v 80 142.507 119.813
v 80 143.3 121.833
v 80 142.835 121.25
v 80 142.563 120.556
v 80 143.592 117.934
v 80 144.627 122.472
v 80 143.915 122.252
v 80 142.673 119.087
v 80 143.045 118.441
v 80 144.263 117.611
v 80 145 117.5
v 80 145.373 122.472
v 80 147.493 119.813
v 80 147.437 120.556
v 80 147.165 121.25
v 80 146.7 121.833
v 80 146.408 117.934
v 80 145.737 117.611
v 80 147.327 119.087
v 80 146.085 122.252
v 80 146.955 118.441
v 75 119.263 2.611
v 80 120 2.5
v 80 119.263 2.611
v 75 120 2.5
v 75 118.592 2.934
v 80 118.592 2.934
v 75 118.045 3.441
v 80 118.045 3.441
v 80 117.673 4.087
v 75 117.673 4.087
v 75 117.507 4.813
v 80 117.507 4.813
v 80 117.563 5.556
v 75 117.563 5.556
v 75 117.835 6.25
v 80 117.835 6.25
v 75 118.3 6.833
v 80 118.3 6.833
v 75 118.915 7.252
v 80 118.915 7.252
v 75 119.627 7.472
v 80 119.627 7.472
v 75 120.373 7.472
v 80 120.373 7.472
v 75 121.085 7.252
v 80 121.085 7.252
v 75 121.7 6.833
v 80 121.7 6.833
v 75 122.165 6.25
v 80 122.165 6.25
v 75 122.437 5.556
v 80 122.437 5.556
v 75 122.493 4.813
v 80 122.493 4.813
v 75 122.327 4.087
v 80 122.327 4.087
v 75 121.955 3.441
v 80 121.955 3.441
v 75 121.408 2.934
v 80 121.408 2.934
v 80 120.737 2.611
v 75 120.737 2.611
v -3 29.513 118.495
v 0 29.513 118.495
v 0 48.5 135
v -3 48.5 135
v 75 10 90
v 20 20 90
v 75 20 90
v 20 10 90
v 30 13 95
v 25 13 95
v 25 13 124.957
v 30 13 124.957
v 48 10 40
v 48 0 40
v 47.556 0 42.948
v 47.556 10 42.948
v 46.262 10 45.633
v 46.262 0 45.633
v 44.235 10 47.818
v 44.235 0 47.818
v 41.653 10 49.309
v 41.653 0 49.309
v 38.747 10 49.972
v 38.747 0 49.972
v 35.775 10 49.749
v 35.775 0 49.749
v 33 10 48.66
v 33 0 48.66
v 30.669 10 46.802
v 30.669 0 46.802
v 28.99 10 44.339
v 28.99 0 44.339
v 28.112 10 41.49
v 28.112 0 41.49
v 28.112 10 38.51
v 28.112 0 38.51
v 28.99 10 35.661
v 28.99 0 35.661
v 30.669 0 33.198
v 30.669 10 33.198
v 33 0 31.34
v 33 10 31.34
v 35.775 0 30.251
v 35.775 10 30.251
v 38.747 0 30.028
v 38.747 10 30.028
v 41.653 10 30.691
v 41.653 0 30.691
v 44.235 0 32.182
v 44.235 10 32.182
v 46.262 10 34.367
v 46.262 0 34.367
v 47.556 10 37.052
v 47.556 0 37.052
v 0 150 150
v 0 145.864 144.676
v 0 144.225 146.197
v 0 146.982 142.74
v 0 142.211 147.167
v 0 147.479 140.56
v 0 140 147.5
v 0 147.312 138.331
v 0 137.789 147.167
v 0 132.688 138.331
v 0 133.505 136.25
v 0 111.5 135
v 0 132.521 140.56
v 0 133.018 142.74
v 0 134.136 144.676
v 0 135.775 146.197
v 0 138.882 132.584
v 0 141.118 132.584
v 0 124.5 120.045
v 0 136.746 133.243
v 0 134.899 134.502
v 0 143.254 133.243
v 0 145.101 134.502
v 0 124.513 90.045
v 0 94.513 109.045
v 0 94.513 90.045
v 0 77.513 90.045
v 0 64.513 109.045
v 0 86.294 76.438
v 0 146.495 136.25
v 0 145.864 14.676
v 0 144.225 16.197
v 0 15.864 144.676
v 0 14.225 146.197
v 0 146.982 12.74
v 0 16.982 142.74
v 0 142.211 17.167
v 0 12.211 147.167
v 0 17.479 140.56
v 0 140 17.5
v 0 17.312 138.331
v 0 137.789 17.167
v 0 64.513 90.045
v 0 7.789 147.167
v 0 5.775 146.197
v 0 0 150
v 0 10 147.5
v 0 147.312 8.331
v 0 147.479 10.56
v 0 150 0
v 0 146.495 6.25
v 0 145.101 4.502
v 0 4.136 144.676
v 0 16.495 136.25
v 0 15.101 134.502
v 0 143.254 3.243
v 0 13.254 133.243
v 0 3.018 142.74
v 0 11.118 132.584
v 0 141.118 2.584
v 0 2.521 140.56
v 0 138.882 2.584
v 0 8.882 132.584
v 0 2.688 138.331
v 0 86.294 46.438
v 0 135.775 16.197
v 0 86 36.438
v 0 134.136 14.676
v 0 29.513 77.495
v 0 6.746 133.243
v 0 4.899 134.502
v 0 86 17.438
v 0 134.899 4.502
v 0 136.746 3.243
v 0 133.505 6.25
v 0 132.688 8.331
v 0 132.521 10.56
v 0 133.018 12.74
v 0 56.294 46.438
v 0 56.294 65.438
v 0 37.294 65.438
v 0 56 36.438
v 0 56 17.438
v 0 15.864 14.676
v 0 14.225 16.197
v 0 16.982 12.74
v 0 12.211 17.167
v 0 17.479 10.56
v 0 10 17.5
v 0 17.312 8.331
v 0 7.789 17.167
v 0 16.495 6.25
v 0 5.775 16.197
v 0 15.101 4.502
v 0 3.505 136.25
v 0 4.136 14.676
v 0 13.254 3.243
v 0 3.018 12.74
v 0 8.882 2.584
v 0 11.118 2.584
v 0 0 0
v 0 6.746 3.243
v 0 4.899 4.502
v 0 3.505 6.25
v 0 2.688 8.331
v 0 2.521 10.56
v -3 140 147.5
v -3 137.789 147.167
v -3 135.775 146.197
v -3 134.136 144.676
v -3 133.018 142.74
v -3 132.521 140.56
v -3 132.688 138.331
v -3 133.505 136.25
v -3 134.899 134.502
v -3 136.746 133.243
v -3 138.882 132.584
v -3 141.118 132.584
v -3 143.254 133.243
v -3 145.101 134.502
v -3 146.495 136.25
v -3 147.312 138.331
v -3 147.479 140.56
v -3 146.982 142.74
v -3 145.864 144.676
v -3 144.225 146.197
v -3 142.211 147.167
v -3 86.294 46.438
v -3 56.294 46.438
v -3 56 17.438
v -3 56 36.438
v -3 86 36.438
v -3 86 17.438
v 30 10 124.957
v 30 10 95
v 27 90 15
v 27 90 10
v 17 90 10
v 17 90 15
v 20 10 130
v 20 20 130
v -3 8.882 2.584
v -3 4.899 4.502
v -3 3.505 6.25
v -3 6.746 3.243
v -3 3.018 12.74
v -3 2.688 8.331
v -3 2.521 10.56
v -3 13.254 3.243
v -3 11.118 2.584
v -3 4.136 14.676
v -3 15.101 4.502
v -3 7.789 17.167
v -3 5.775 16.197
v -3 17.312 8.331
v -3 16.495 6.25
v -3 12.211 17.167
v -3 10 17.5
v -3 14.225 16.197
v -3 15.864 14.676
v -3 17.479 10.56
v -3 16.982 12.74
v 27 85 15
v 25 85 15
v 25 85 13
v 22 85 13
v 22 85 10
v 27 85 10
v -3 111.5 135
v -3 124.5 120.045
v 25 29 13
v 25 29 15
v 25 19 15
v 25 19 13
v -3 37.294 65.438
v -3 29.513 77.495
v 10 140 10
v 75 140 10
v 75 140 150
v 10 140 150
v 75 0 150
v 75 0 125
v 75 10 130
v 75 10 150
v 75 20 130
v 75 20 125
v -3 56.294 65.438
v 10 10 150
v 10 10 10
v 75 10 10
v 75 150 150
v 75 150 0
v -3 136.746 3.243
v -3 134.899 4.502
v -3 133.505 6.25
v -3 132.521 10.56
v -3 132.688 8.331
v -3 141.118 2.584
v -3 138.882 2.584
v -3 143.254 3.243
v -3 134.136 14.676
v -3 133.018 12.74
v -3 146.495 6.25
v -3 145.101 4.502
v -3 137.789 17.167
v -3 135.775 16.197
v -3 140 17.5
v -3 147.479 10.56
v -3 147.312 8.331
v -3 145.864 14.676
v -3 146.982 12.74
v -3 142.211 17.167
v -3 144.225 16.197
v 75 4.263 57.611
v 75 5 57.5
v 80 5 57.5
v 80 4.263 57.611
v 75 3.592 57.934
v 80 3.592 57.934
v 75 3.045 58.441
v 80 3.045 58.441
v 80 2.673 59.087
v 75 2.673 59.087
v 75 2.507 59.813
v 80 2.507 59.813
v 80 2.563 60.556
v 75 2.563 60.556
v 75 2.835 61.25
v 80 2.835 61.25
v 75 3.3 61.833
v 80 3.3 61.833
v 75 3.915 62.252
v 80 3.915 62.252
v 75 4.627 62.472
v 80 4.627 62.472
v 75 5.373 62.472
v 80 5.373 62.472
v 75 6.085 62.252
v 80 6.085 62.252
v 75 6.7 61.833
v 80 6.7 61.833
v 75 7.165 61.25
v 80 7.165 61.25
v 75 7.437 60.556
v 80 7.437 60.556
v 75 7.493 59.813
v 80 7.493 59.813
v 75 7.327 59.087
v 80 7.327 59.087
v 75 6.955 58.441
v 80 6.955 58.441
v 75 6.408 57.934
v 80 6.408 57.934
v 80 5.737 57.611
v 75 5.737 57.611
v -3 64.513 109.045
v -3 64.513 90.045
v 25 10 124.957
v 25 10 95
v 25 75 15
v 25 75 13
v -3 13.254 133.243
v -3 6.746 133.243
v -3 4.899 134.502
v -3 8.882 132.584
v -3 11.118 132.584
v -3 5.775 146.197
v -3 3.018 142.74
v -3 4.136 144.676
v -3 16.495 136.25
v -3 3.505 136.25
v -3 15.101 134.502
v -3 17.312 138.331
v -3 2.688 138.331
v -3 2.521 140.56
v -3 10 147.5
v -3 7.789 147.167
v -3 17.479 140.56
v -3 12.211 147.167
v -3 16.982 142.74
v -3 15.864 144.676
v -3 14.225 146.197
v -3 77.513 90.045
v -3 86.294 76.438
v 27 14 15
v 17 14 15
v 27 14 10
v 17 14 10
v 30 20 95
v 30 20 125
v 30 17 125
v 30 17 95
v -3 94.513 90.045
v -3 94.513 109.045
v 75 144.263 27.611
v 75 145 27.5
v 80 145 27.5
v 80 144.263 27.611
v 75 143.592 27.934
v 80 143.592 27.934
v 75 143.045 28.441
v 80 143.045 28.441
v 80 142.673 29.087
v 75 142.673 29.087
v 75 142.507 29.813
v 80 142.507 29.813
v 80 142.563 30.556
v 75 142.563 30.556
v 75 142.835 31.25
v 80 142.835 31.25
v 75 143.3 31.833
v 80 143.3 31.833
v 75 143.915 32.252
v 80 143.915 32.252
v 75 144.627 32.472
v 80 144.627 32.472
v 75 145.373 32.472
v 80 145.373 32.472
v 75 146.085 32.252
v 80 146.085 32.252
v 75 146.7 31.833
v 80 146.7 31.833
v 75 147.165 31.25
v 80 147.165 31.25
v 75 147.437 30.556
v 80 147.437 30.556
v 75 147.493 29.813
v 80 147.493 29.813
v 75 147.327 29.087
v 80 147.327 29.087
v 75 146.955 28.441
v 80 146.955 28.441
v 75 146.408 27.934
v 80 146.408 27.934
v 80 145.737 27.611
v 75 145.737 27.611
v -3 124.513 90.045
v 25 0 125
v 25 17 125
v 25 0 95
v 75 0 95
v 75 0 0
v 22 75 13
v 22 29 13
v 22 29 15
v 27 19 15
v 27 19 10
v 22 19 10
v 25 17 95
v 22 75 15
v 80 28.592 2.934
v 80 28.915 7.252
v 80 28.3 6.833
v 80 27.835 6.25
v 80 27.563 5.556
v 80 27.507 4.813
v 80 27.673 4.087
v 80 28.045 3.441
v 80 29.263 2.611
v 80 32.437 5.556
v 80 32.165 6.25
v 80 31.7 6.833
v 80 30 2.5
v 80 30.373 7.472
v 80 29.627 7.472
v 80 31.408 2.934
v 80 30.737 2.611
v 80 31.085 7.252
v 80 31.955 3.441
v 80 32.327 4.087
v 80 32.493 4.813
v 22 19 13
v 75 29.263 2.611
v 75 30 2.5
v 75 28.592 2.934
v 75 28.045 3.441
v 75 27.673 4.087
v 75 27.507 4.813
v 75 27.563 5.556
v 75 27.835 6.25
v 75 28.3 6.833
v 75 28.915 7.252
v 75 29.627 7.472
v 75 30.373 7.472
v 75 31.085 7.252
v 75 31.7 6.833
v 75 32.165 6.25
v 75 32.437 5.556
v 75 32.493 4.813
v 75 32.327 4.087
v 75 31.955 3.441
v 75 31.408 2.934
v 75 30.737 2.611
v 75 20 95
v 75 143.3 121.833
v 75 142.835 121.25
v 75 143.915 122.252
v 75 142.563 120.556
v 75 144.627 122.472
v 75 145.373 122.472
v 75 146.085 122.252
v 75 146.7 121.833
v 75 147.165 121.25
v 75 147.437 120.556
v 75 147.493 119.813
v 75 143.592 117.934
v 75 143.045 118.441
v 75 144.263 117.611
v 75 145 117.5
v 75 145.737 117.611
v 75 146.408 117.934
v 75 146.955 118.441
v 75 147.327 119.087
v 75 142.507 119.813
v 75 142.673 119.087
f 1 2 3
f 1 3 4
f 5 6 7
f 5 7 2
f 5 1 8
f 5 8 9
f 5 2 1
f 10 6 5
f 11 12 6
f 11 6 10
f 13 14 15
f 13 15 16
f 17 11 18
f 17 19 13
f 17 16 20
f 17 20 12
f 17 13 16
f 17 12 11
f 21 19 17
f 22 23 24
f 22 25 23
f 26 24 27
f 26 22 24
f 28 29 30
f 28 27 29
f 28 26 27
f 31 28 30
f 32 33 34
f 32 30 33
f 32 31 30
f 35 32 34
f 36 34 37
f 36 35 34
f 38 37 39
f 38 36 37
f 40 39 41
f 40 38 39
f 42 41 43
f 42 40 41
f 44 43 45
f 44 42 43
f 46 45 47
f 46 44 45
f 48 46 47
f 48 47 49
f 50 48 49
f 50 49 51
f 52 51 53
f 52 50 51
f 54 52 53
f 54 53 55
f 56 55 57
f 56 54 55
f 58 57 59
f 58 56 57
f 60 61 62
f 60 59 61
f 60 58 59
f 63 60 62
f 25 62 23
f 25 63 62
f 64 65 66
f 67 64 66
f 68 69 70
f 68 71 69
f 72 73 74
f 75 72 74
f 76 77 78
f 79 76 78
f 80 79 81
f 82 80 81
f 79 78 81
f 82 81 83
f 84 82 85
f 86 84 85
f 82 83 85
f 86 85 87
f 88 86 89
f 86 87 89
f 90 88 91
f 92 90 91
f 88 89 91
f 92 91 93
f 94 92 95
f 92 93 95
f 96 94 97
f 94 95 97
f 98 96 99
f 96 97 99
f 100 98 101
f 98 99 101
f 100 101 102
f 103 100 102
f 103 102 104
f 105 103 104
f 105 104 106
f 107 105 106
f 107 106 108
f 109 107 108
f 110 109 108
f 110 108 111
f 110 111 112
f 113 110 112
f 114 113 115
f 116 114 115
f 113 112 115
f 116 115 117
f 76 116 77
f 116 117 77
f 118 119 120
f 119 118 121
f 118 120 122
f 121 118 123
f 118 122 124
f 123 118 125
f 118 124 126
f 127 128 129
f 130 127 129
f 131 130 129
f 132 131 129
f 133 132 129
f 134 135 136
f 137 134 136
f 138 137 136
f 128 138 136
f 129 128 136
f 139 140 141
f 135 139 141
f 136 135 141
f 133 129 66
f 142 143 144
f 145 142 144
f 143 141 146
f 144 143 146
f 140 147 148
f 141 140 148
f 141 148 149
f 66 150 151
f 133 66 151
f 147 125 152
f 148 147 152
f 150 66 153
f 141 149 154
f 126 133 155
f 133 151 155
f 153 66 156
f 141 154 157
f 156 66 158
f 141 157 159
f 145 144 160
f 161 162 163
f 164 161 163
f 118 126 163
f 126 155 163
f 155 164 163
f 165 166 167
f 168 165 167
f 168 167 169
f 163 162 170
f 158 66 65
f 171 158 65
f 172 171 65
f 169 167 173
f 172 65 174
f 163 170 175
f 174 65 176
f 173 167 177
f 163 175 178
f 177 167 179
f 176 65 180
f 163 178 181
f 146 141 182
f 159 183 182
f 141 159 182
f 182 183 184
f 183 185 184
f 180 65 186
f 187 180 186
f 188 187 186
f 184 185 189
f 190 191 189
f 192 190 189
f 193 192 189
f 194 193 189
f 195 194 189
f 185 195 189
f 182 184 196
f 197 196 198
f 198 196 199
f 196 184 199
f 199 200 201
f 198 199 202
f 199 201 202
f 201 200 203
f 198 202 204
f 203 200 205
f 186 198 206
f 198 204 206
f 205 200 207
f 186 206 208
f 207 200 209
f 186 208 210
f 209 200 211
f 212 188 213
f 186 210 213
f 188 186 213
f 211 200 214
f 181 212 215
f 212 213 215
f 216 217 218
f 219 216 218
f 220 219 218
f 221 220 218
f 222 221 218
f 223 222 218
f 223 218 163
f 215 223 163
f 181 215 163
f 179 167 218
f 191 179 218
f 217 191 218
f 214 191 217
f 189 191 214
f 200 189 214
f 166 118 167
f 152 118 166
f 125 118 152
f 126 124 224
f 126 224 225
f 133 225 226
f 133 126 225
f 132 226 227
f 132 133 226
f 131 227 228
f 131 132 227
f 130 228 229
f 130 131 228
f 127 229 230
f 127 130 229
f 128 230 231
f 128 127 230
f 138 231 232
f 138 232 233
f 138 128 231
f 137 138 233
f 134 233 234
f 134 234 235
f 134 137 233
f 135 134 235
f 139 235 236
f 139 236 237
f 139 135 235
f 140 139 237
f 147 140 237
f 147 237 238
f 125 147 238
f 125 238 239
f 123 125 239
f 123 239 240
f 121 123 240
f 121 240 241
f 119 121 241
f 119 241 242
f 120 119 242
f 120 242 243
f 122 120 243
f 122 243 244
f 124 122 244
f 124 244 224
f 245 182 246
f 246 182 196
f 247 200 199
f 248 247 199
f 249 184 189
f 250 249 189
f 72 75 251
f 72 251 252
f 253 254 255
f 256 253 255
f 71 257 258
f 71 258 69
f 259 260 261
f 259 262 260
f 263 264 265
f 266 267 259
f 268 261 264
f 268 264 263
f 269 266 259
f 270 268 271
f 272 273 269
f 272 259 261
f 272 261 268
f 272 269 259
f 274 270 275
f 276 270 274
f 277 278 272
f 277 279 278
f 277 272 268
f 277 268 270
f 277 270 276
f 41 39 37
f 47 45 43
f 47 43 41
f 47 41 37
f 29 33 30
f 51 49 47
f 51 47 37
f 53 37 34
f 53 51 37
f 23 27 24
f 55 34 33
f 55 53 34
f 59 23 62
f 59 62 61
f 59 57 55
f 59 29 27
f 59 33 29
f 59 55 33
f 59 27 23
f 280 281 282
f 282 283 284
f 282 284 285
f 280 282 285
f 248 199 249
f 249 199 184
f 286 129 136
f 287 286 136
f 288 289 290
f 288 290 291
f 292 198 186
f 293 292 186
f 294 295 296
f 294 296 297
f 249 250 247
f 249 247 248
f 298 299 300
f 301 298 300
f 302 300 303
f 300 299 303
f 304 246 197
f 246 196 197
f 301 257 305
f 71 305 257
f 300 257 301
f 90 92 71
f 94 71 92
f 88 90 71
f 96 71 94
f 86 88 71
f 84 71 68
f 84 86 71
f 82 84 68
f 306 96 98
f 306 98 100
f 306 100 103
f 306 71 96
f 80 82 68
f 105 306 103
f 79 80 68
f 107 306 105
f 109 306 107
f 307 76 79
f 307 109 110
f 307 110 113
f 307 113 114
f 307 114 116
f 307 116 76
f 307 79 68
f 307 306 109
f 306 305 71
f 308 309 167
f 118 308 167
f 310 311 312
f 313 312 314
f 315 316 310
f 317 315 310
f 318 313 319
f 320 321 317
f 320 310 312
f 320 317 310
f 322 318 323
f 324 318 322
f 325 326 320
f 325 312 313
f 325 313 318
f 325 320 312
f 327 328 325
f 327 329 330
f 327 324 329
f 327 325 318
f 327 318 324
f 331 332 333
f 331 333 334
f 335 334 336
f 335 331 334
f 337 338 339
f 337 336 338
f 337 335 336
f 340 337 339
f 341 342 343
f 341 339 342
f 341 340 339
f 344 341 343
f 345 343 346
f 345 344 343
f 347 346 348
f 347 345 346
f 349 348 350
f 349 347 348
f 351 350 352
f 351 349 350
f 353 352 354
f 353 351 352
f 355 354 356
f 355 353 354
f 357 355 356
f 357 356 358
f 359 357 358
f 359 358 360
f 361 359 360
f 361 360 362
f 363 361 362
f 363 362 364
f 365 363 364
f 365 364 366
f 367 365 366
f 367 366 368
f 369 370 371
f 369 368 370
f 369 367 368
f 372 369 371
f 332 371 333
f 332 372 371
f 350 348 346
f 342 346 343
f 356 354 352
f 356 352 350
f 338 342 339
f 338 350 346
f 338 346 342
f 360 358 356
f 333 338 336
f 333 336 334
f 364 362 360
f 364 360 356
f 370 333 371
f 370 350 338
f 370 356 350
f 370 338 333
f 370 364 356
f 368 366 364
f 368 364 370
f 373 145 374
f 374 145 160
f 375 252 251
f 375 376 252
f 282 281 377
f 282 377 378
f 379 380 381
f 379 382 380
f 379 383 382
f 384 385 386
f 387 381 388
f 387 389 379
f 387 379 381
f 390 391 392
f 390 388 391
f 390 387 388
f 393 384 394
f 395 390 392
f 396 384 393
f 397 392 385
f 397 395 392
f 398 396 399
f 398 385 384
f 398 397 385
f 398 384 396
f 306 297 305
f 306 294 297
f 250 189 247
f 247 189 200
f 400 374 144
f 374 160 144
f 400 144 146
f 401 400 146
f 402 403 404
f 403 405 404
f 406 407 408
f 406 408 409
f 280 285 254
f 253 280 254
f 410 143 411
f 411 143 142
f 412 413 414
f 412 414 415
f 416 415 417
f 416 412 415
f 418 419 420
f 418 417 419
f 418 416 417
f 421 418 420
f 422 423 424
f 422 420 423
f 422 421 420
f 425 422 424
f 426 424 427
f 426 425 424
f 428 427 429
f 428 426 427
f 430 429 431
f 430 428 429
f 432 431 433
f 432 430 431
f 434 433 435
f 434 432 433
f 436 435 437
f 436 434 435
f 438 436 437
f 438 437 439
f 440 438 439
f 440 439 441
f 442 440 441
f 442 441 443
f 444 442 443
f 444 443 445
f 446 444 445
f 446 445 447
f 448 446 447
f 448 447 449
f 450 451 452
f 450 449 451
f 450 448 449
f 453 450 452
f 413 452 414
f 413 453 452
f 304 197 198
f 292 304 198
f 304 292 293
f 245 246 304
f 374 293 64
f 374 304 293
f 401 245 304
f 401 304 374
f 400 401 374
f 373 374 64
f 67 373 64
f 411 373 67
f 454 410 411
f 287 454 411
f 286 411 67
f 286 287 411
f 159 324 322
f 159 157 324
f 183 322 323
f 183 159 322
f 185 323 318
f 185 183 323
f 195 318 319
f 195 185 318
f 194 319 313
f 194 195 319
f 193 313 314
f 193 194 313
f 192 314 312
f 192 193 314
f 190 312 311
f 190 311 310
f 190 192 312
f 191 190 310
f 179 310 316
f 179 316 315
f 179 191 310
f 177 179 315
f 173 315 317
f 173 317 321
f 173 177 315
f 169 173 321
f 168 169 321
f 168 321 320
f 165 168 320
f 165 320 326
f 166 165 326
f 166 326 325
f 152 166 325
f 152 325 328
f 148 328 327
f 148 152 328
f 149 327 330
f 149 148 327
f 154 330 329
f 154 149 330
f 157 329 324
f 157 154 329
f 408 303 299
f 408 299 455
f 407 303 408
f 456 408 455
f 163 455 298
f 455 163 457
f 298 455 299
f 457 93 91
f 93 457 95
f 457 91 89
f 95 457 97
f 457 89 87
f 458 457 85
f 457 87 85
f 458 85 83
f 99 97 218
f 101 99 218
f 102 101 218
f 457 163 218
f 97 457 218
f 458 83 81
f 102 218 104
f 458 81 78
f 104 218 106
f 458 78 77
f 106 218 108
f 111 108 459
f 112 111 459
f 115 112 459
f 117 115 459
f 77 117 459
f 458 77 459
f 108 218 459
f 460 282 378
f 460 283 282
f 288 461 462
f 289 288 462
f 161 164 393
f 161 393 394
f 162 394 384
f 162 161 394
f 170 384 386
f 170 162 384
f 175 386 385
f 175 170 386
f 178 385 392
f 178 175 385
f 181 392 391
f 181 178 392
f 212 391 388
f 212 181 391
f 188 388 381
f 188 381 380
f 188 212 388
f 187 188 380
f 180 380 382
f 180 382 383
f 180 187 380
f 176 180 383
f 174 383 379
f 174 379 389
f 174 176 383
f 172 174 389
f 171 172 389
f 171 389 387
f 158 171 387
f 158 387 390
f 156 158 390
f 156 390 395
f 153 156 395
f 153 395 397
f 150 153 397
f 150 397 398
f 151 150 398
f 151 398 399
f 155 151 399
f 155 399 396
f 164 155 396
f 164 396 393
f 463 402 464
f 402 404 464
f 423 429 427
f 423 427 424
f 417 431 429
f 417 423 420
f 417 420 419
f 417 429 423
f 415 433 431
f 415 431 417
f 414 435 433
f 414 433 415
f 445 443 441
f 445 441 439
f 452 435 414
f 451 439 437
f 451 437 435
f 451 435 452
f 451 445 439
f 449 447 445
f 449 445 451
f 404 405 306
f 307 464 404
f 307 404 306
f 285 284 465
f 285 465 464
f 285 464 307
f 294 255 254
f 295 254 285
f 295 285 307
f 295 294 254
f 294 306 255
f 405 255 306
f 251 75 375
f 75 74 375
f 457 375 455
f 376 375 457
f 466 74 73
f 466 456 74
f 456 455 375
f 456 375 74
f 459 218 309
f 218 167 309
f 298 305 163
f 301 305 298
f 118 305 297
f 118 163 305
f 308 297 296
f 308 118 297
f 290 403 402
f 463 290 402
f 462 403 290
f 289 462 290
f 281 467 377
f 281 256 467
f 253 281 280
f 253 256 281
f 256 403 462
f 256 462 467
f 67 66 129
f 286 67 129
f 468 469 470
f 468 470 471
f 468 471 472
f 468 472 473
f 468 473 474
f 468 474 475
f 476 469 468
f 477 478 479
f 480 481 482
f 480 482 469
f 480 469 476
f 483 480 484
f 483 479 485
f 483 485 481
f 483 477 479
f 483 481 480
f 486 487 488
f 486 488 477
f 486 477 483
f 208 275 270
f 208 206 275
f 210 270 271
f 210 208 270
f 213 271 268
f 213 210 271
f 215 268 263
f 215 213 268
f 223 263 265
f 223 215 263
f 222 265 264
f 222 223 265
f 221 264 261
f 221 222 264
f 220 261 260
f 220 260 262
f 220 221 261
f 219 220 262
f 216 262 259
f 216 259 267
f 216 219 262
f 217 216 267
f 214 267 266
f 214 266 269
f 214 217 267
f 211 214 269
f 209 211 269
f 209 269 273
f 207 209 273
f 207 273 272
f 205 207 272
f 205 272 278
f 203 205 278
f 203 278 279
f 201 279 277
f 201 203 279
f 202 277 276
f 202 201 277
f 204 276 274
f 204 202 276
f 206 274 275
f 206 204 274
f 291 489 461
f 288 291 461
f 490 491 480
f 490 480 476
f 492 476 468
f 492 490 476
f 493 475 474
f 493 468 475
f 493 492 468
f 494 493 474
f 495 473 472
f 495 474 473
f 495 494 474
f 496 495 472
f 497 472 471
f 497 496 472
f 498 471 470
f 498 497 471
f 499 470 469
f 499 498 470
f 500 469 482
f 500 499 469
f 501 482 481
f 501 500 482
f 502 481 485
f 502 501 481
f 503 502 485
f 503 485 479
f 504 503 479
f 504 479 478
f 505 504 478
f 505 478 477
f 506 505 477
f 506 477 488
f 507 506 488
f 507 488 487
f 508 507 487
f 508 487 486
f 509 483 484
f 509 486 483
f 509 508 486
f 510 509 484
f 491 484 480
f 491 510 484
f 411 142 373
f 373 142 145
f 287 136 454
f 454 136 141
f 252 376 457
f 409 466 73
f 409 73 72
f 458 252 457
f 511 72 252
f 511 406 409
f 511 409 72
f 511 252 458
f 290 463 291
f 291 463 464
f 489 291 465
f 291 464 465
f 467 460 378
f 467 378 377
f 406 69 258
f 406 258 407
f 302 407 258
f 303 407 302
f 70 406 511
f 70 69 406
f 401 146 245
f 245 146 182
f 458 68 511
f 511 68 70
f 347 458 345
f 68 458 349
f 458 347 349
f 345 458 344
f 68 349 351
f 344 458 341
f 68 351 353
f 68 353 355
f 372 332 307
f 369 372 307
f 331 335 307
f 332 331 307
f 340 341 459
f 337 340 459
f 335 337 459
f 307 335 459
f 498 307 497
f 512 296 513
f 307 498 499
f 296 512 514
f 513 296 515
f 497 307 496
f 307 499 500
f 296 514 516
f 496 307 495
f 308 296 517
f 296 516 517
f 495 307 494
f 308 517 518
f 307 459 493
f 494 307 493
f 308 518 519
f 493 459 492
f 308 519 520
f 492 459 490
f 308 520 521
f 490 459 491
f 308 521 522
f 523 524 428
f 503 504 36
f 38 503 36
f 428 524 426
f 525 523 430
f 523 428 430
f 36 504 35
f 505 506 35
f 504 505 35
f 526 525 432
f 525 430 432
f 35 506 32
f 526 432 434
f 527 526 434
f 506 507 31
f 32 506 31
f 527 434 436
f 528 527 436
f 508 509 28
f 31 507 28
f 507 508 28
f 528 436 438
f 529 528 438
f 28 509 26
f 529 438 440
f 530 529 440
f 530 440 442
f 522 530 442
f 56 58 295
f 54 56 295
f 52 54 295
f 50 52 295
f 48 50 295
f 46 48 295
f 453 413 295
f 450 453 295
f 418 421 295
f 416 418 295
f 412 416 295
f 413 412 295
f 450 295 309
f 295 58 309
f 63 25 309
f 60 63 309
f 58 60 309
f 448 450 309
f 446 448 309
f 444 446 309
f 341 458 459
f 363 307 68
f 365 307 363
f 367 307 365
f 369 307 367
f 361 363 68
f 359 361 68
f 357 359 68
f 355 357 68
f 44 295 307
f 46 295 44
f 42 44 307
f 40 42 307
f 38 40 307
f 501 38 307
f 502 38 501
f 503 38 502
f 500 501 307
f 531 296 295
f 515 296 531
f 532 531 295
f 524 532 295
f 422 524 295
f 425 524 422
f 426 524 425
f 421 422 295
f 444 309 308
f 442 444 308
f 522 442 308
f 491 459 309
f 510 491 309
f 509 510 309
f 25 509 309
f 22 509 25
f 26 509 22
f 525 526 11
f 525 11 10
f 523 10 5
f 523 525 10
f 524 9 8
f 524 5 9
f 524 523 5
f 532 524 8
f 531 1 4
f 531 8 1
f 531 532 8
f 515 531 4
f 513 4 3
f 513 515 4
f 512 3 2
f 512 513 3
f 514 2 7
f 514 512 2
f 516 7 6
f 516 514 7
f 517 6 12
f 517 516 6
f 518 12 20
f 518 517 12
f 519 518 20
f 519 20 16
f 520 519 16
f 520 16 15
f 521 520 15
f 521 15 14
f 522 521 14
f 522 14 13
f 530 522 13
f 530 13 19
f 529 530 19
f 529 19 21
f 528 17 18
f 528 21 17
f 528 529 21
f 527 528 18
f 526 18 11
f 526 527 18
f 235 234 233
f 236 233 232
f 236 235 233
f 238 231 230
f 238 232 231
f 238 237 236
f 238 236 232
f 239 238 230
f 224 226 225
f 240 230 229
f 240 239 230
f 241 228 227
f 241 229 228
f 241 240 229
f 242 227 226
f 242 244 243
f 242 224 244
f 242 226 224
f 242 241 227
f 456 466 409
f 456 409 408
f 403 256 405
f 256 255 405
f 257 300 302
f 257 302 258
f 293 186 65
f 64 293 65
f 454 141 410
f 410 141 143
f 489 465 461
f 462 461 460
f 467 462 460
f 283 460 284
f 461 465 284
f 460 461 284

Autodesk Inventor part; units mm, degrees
ref_plane "YZ Plane" through (0, 0, 0) normal (1, 0, 0) x (0, 1, 0)
ref_plane "XZ Plane" through (0, 0, 0) normal (0, 1, 0) x (-1, 0, 0)
ref_plane "XY Plane" through (0, 0, 0) normal (0, 0, 1) x (1, 0, 0)
sketch "Sketch1" plane through (0, 0, 0) normal (0, 0, 1) x (1, 0, 0)
  line L0 (0, 0) -> (75, 0)
  line L1 (75, 0) -> (75, 150)
  line L2 (75, 150) -> (0, 150)
  line L3 (0, 150) -> (0, 0)
  dimension "d0" = 75
  dimension "d1" = 150
extrude "Extrusion1" add sketch "Sketch1" along normal blind 10
sketch "Sketch2" plane through (0, 0, 10) normal (0, 0, 1) x (1, 0, 0)
  line L0 (17, 90) -> (17, 14)
  line L1 (17, 14) -> (27, 14)
  line L2 (27, 14) -> (27, 19)
  line L3 (27, 19) -> (22, 19)
  line L4 (22, 19) -> (22, 85)
  line L5 (22, 85) -> (27, 85)
  line L6 (27, 85) -> (27, 90)
  line L7 (27, 90) -> (17, 90)
  line L8 (75, 0) -> (75, 150) projected
  line L9 (75, 150) -> (0, 150) projected
  point P0 (0, 0)
  dimension "d4" = 76
  dimension "d5" = 10
  dimension "d6" = 5
  dimension "d7" = 66
  dimension "d8" = 53
  dimension "d9" = 5
  dimension "d10" = 60
extrude "Extrusion2" add sketch "Sketch2" along normal blind 5
sketch "Sketch3" plane through (22, 19, 10) normal (1, 0, 0) x (0, 0, -1)
  line L0 (-5, 0) -> (-5, 66) projected
  line L1 (-5, 66) -> (-3, 66)
  line L2 (-3, 66) -> (-3, 56)
  line L3 (-3, 56) -> (-5, 56)
  line L4 (-5, 56) -> (-5, 66)
  line L5 (-5, 0) -> (-3, 0)
  line L6 (-3, 0) -> (-3, 10)
  line L7 (-3, 10) -> (-5, 10)
  line L8 (-5, 10) -> (-5, 0)
  point P0 (10, -19)
  point P1 (-5, 10)
  point P2 (-5, 56)
  dimension "d13" = 2
  dimension "d14" = 10
  dimension "d15" = 10
  dimension "d73" = 2
extrude "Extrusion3" add sketch "Sketch3" along normal blind 3
sketch "Sketch4" plane through (0, 0, 10) normal (0, 0, 1) x (1, 0, 0)
  line L0 (75, 0) -> (75, 150) projected
  line L1 (75, 140) -> (10, 140)
  line L2 (10, 140) -> (10, 10)
  line L3 (10, 10) -> (75, 10)
  line L4 (75, 150) -> (0, 150) projected
  line L5 (0, 150) -> (0, 0) projected
  line L6 (0, 0) -> (75, 0) projected
  dimension "d18" = 10
  dimension "d19" = 10
  dimension "d20" = 10
extrude "Extrusion4" add sketch "Sketch4" along normal blind 140 contours L6 L5 L4 L0 L1 L2 L3
sketch "Sketch5" plane through (0, 0, 0) normal (-1, 0, 0) x (0, 0, 1)
  line L0 (90.0447, 124.5126) -> (90.0447, 94.5126)
  line L1 (90.0447, 94.5126) -> (109.0447, 94.5126)
  line L2 (109.0447, 94.5126) -> (109.0447, 64.5126)
  line L3 (109.0447, 64.5126) -> (90.0447, 64.5126)
  line L4 (90.0447, 64.5126) -> (90.0447, 77.5126)
  line L5 (90.0447, 77.5126) -> (76.4377, 86.2941)
  line L6 (76.4377, 86.2941) -> (46.4377, 86.2941)
  line L7 (46.4377, 86.2941) -> (46.4377, 56.2941)
  line L8 (46.4377, 56.2941) -> (65.4377, 56.2941)
  line L9 (65.4377, 56.2941) -> (65.4377, 37.2941)
  line L10 (65.4377, 37.2941) -> (77.4951, 29.5126)
  line L11 (77.4951, 29.5126) -> (118.4951, 29.5126)
  line L12 (118.4951, 29.5126) -> (135, 48.5)
  line L13 (135, 48.5) -> (135, 111.5)
  line L14 (135, 111.5) -> (120.0447, 124.5)
  line L15 (120.0447, 124.5) -> (90.0447, 124.5126)
  line L16 (0, 0) -> (150, 0) projected
  line L17 (150, 150) -> (150, 0) projected
  line L18 (36.4377, 86) -> (17.4377, 86)
  line L19 (17.4377, 86) -> (17.4377, 56)
  line L20 (17.4377, 56) -> (36.4377, 56)
  line L21 (36.4377, 56) -> (36.4377, 86)
  line L22 (10, 140) -> (150, 140) projected
  circle A0 centre (140, 140) radius 7.5
  line L23 (10, 10) -> (150, 10) projected
  circle A1 centre (140, 10) radius 7.5
  circle A2 centre (10, 140) radius 7.5
  line L24 (10, 10) -> (10, 140) projected
  circle A3 centre (10, 10) radius 7.5
  point P0 (99.5447, 64.5126)
  point P1 (135, 80)
  point P2 (26.9377, 56)
  dimension "d43" = 30
  dimension "d44" = 19
  dimension "d45" = 30
  dimension "d46" = 13
  dimension "d47" = 30
  dimension "d48" = 30
  dimension "d49" = 19
  dimension "d50" = 19
  dimension "d51" = 41
  dimension "d52" = 63
  dimension "d53" = 13
  dimension "d56" = 35
  dimension "d57" = 95
  dimension "d58" = 30
  dimension "d59" = 80
  dimension "d60" = 25.9553
  dimension "d61" = 15
  dimension "d62" = 19
  dimension "d63" = 10
  dimension "d67" = 15
  dimension "d68" = 15
  dimension "d69" = 15
  dimension "d70" = 15
  dimension "d71" = 10
  dimension "d72" = 10
  dimension "d112" = 56
  dimension "d113" = 30
extrude "Extrusion5" add sketch "Sketch5" along normal blind 3 contours L15 L14 L13 L12 L11 L10 L9 L8 L7 L6 L5 L4 L3 L2 L1 L0 | A0 L22 | L22 A0 | A1 L23 | L23 A1 | A2 L24 L22 | L22 L24 A2 | A3 L24 L23 | L23 L24 A3 | L21 L20 L19 L18
sketch "Sketch8" plane through (10, 10, 10) normal (0, 1, 0) x (1, 0, 0)
  line L0 (65, 0) -> (65, -140) projected
  line L1 (65, -115) -> (15, -115)
  line L2 (15, -115) -> (15, -85)
  line L3 (15, -85) -> (65, -85)
  line L4 (65, -115) -> (65, -120)
  line L5 (65, -120) -> (10, -120)
  line L6 (10, -120) -> (10, -80)
  line L7 (10, -80) -> (65, -80)
  line L8 (-10, -140) -> (65, -140) projected
  point P0 (-10, 10)
  dimension "d74" = 30
  dimension "d75" = 50
  dimension "d76" = 5
  dimension "d77" = 55
  dimension "d78" = 40
  dimension "d111" = 20
extrude "Extrusion6" add sketch "Sketch8" along normal blind 10 contours L0 L3 L2 L1 L5 L6 L7
sketch "Sketch10" plane through (25, 10, 125) normal (0, 1, 0) x (1, 0, 0)
  line L0 (50, 30) -> (50, 0) projected
  line L1 (0, 30) -> (50, 30) projected
  line L2 (50, 0) -> (0, 0)
  line L3 (0, 0) -> (0, 30)
  line L4 (0, 30) -> (50, 30)
  line L5 (50, 30) -> (50, 0)
  point P0 (-25, 125)
extrude "Extrusion7" cut sketch "Sketch10" against normal blind 10
sketch "Sketch11" plane through (25, 0, 95) normal (1, 0, 0) x (0, 0, -1)
  line L0 (85, 10) -> (-55, 10) projected
  line L1 (-29.957, 10) -> (0.043, 10)
  line L2 (0.043, 10) -> (0.043, 13)
  line L3 (0.043, 13) -> (-29.957, 13)
  line L4 (-29.957, 13) -> (-29.957, 10)
  line L5 (-30, 20) -> (0, 20) projected
  line L6 (-30, 20) -> (0, 20)
  line L7 (0, 20) -> (0, 17)
  line L8 (0, 17) -> (-30, 17)
  line L9 (-30, 17) -> (-30, 20)
  point P0 (95, 0)
  dimension "d83" = 30
  dimension "d84" = 30
  dimension "d85" = 3
  dimension "d86" = 3
extrude "Extrusion8" add sketch "Sketch11" along normal blind 5
sketch "Sketch12" plane through (75, 0, 0) normal (1, 0, 0) x (0, 0, -1)
  circle A0 centre (-5, 30) radius 2.5
  circle A1 centre (-5, 120) radius 2.5
  circle A2 centre (-120, 145) radius 2.5
  circle A3 centre (-30, 145) radius 2.5
  circle A4 centre (-60, 5) radius 2.5
  line L0 (-150, 140) -> (-150, 150) projected
  line L1 (0, 150) -> (-150, 150) projected
  line L2 (0, 0) -> (0, 150) projected
  line L3 (0, 0) -> (-95, 0) projected
  line L4 (-10, 10) -> (-90, 10) projected
  point P0 (-150, 145)
  dimension "d89" = 5
  dimension "d90" = 5
  dimension "d91" = 5
  dimension "d92" = 5
  dimension "d93" = 5
  dimension "d94" = 30
  dimension "d95" = 5
  dimension "d96" = 30
  dimension "d97" = 5
  dimension "d98" = 5
  dimension "d99" = 30
  dimension "d100" = 30
  dimension "d101" = 5
  dimension "d102" = 5
  dimension "d103" = 60
sketch "Sketch13" plane through (0, 0, 0) normal (0, -1, 0) x (1, 0, 0)
  circle A0 centre (38, 40) radius 10
  line L0 (75, 0) -> (75, 95) projected
  line L1 (0, 0) -> (75, 0) projected
  point P0 (37.5, 0)
  dimension "d106" = 20
  dimension "d107" = 37
  dimension "d108" = 40
extrude "Extrusion9" add sketch "Sketch12" along normal blind 5
extrude "Extrusion10" cut sketch "Sketch13" against normal blind 10
properties part number "vraagblok"
